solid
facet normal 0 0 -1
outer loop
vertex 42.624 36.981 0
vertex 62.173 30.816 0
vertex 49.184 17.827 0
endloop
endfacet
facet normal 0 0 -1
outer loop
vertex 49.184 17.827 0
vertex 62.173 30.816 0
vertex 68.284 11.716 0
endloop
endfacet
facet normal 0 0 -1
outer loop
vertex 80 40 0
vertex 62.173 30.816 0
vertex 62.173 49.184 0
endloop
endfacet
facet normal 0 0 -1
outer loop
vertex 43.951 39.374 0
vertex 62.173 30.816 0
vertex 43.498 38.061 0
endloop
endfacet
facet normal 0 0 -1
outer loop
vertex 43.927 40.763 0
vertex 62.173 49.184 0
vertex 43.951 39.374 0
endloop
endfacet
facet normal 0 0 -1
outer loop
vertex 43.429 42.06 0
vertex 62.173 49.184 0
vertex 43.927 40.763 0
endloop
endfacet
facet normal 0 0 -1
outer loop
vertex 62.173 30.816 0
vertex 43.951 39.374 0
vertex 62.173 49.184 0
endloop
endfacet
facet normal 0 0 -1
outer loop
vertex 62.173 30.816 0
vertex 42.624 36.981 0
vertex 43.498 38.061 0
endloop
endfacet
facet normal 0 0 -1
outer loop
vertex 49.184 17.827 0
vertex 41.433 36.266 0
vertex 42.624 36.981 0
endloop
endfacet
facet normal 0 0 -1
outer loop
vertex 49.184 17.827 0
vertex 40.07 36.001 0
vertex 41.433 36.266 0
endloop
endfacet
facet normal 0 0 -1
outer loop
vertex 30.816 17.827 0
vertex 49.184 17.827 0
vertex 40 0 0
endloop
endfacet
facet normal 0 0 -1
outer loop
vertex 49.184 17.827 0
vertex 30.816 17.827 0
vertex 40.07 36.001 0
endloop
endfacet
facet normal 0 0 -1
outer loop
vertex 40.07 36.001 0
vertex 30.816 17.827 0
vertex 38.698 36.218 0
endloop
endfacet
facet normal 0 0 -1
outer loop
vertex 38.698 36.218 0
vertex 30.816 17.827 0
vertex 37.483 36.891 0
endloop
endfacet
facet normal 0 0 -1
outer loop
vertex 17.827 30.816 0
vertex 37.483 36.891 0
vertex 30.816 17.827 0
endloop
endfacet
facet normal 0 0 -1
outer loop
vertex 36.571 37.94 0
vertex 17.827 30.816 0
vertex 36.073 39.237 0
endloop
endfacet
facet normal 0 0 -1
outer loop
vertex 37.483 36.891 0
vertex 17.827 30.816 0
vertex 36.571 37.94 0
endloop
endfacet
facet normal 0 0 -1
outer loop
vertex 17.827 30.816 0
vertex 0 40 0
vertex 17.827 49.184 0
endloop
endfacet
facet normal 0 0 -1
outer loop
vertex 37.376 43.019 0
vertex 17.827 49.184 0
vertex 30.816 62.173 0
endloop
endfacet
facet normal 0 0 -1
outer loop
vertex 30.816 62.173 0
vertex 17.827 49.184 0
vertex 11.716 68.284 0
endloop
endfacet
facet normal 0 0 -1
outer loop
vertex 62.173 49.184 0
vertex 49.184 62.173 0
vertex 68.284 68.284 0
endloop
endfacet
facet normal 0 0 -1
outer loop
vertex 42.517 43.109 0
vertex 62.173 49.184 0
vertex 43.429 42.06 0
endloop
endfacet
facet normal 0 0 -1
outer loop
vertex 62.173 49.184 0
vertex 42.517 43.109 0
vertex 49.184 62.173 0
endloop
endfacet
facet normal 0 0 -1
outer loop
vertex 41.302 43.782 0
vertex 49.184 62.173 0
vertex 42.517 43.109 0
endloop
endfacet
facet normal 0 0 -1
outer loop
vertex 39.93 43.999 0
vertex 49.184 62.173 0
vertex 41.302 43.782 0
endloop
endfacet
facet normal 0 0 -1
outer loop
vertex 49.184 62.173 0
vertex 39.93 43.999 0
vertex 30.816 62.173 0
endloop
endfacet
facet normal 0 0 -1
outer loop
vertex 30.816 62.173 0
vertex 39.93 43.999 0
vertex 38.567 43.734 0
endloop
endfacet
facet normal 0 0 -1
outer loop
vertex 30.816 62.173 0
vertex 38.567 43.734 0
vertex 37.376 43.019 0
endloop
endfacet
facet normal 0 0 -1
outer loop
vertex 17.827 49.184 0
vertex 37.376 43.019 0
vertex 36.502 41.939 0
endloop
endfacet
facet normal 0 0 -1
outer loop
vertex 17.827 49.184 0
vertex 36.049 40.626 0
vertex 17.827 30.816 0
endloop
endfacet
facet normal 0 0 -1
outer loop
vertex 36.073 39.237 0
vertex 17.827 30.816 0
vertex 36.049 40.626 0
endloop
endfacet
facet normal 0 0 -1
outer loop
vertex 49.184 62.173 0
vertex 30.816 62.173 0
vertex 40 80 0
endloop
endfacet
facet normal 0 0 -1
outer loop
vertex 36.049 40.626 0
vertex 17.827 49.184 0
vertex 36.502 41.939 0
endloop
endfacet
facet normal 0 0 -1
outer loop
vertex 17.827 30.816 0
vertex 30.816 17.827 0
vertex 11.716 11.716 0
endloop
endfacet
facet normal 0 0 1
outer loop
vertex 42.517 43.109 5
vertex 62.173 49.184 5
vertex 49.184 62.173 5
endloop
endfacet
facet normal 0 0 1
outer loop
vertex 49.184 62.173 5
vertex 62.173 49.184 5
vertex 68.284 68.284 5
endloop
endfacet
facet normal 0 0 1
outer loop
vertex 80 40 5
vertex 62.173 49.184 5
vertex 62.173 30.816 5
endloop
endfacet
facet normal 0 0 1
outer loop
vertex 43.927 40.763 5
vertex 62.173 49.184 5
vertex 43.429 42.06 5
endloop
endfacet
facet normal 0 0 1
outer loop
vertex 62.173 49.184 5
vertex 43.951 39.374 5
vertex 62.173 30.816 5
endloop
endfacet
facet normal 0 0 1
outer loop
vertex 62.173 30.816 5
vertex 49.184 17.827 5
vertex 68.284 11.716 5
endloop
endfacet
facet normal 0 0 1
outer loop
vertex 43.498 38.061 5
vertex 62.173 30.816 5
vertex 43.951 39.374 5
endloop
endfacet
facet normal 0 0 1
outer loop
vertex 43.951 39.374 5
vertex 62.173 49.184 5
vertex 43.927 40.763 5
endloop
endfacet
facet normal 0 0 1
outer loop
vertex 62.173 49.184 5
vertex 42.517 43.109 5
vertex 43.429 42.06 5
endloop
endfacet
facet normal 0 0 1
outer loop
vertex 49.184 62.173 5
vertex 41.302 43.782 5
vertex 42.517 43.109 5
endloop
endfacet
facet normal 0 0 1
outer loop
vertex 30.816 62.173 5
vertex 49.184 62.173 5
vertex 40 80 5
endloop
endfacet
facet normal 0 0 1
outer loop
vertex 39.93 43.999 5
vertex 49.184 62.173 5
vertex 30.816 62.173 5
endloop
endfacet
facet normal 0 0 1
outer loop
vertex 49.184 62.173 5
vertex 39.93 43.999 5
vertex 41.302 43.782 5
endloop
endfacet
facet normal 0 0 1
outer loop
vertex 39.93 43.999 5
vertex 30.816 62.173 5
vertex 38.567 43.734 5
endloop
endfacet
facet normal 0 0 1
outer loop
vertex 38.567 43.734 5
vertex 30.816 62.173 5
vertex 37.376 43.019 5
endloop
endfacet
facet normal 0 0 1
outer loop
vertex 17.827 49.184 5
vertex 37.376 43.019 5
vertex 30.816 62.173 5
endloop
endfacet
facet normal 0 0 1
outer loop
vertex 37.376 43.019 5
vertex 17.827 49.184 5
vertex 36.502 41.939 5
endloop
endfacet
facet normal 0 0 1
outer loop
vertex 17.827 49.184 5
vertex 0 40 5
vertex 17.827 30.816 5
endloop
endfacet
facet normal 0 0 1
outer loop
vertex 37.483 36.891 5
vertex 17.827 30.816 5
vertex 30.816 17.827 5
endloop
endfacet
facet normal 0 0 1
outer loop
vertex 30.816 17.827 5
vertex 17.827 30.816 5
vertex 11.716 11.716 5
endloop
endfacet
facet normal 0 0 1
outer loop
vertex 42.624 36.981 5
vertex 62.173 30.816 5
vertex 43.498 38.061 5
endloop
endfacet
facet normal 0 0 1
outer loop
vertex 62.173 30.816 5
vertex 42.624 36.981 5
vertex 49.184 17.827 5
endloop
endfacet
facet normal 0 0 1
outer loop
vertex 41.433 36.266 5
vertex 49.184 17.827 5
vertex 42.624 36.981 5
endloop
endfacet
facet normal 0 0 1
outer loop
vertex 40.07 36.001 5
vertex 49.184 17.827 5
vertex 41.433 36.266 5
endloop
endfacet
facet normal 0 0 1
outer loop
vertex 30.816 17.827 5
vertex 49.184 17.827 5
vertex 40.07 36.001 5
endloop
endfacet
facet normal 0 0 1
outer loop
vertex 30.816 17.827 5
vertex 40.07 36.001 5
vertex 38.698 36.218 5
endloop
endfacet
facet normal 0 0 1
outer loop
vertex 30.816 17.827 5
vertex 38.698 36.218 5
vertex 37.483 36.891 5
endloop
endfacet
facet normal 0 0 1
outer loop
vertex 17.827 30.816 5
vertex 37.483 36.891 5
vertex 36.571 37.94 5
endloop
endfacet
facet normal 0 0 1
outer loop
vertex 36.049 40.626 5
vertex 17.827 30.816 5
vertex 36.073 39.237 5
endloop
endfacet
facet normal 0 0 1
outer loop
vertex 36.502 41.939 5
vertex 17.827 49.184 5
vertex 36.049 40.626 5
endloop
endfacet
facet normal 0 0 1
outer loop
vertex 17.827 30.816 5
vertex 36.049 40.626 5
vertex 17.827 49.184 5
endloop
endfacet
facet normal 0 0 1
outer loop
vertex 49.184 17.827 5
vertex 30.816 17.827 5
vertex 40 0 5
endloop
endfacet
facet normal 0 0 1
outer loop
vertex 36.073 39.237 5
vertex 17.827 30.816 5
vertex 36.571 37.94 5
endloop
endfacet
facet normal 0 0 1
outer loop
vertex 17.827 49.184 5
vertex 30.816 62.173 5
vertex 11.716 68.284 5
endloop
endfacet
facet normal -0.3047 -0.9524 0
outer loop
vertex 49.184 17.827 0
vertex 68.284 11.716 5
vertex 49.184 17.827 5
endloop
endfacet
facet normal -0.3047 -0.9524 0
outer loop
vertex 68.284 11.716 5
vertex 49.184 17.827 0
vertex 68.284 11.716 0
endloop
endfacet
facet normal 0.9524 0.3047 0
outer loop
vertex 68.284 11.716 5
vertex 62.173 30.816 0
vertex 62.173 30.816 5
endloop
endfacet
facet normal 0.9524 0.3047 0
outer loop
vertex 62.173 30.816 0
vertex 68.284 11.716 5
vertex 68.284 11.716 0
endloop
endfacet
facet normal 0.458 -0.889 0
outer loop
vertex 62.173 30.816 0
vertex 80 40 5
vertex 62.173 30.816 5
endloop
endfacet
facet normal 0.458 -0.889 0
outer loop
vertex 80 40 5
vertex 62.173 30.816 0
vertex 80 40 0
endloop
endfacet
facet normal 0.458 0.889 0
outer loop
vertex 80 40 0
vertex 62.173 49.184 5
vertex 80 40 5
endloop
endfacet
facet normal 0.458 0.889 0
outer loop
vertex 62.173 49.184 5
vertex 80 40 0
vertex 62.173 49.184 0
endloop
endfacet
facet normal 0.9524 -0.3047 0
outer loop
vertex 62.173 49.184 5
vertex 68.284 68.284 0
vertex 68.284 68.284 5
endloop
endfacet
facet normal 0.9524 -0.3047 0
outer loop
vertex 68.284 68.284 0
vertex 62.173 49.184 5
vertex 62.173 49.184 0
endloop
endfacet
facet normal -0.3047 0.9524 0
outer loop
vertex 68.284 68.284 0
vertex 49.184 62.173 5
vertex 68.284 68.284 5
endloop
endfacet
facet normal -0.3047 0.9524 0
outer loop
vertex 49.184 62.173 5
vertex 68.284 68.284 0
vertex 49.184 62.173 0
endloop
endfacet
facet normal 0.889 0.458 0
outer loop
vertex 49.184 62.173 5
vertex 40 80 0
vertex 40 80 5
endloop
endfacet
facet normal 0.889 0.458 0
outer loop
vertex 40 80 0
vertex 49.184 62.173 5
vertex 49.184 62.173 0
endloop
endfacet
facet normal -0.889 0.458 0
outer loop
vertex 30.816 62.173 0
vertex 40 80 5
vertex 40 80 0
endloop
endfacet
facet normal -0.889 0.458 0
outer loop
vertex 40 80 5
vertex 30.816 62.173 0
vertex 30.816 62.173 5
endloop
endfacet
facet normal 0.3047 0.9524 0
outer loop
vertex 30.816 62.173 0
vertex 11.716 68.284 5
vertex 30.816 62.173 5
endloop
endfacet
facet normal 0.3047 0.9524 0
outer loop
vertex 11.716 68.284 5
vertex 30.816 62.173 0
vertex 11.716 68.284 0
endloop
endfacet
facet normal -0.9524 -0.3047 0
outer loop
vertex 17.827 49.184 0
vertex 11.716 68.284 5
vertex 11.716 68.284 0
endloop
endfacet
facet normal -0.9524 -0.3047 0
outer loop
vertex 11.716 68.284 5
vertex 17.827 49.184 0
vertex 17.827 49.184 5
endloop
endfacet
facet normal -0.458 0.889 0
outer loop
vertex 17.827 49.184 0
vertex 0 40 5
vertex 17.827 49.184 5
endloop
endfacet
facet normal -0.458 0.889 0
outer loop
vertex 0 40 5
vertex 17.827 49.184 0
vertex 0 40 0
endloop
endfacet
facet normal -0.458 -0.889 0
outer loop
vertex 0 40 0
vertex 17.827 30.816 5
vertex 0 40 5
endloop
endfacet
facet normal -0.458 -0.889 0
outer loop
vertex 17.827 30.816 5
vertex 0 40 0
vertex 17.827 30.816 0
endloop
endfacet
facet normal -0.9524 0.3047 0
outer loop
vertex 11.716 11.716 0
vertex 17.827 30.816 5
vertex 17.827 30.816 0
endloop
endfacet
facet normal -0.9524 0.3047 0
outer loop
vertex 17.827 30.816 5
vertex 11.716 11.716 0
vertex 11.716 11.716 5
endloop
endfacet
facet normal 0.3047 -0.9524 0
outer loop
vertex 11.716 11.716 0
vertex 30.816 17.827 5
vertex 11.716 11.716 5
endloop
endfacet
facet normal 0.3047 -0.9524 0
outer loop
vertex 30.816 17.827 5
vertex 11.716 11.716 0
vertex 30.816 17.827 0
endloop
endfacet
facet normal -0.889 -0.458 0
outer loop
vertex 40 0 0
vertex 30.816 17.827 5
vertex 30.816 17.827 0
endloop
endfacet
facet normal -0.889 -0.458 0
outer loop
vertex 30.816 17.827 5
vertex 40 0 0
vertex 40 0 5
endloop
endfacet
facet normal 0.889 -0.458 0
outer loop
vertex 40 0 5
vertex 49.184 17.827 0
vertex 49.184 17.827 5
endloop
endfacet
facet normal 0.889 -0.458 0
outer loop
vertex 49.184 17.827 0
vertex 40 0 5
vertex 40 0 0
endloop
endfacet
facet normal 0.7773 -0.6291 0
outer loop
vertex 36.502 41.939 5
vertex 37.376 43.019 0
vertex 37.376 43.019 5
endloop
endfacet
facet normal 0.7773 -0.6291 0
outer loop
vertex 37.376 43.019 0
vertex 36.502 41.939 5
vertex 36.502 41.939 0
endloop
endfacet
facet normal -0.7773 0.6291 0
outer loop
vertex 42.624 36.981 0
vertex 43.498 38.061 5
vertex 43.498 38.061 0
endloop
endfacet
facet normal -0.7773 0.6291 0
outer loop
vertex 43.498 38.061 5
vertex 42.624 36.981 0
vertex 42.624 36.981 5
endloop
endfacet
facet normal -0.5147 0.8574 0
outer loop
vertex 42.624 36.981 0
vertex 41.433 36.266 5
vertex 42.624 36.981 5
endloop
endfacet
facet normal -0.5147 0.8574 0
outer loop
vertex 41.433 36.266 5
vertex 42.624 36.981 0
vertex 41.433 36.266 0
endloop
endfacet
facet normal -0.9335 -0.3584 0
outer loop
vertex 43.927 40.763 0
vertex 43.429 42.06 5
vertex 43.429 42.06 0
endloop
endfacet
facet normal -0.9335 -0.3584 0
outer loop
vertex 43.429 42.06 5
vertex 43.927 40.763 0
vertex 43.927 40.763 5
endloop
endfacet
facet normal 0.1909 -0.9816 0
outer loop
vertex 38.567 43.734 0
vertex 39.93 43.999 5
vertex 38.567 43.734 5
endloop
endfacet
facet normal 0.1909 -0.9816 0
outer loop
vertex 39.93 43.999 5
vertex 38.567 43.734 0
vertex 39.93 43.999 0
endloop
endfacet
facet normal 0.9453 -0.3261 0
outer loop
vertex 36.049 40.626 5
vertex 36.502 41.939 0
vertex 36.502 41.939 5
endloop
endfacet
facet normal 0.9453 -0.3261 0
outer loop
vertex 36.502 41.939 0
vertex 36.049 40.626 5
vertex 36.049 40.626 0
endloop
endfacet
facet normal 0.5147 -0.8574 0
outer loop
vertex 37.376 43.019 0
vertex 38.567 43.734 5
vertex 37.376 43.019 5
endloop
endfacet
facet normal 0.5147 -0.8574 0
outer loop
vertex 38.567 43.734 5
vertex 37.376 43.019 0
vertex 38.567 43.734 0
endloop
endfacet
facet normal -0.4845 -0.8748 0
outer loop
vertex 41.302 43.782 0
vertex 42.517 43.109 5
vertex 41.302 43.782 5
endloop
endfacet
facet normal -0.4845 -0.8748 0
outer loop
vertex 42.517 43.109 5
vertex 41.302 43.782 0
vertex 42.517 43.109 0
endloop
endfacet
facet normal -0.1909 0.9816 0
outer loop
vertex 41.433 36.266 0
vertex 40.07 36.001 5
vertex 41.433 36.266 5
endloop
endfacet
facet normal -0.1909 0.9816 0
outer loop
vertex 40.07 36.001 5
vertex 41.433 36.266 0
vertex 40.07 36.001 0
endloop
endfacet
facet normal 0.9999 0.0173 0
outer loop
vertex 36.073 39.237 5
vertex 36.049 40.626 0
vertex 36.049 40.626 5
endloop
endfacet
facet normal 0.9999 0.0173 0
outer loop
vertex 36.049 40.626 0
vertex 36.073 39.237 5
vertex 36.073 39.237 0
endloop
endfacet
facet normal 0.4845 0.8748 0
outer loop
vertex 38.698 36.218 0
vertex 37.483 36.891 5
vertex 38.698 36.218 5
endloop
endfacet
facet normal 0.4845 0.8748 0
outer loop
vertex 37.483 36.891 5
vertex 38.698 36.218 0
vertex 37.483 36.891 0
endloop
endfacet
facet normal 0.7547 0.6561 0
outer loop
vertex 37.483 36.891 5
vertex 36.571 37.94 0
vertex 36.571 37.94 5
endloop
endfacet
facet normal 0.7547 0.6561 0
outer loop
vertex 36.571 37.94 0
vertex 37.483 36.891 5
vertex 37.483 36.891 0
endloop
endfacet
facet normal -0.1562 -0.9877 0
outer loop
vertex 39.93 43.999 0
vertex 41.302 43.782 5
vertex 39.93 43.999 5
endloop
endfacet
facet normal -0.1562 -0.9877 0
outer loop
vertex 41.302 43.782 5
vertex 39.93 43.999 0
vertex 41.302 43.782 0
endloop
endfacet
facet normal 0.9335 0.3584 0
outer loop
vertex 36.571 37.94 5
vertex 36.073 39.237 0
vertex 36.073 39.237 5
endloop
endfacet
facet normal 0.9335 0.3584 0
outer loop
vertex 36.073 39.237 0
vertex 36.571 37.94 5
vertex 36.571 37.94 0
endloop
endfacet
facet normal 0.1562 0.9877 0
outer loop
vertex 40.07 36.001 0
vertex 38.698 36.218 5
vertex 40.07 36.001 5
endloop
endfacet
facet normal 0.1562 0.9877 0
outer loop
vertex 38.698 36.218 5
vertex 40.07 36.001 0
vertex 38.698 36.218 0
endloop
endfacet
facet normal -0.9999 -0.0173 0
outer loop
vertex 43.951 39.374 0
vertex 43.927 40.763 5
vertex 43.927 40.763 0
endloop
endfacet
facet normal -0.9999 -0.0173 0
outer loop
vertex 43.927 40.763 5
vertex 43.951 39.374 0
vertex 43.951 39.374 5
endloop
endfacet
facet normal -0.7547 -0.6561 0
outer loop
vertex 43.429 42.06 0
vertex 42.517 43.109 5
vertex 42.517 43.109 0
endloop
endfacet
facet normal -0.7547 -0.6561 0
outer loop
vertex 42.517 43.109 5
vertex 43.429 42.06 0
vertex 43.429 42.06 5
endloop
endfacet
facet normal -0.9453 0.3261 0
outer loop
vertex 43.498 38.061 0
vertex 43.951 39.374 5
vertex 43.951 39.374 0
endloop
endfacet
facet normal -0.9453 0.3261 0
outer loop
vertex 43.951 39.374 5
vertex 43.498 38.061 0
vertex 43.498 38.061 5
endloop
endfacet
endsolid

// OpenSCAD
$fn = 32;

// ----------------------------------------------------------------------
// Star wheel: 8-point star, R40
// ----------------------------------------------------------------------

// --- parameters (mm) ---
n_points = 8;             // number of points / teeth
r_out = 40;               // tip radius
r_in = 24;                // root radius
bore_r = 4;               // centre bore radius
plate_t = 5;              // plate thickness, Z (extrusion height)
bore_d = 8;               // centre bore diameter

profile = [[80, 40], [62.173, 49.184], [68.284, 68.284], [49.184, 62.173], [40, 80], [30.816, 62.173], [11.716, 68.284], [17.827, 49.184], [0, 40], [17.827, 30.816], [11.716, 11.716], [30.816, 17.827], [40, 0], [49.184, 17.827], [68.284, 11.716], [62.173, 30.816]];  // primary outline, 16 points, counter clockwise
void_1 = [[43.927, 40.763], [43.429, 42.06], [42.517, 43.109], [41.302, 43.782], [39.93, 43.999], [38.567, 43.734], [37.376, 43.019], [36.502, 41.939], [36.049, 40.626], [36.073, 39.237], [36.571, 37.94], [37.483, 36.891], [38.698, 36.218], [40.07, 36.001], [41.433, 36.266], [42.624, 36.981], [43.498, 38.061], [43.951, 39.374]];  // centre bore, 18 points

// --- the one profile operation ---
difference() {
  linear_extrude(height = plate_t) polygon(points = profile);
  translate([0, 0, -1])
    linear_extrude(height = plate_t + 2) polygon(points = void_1);
}
